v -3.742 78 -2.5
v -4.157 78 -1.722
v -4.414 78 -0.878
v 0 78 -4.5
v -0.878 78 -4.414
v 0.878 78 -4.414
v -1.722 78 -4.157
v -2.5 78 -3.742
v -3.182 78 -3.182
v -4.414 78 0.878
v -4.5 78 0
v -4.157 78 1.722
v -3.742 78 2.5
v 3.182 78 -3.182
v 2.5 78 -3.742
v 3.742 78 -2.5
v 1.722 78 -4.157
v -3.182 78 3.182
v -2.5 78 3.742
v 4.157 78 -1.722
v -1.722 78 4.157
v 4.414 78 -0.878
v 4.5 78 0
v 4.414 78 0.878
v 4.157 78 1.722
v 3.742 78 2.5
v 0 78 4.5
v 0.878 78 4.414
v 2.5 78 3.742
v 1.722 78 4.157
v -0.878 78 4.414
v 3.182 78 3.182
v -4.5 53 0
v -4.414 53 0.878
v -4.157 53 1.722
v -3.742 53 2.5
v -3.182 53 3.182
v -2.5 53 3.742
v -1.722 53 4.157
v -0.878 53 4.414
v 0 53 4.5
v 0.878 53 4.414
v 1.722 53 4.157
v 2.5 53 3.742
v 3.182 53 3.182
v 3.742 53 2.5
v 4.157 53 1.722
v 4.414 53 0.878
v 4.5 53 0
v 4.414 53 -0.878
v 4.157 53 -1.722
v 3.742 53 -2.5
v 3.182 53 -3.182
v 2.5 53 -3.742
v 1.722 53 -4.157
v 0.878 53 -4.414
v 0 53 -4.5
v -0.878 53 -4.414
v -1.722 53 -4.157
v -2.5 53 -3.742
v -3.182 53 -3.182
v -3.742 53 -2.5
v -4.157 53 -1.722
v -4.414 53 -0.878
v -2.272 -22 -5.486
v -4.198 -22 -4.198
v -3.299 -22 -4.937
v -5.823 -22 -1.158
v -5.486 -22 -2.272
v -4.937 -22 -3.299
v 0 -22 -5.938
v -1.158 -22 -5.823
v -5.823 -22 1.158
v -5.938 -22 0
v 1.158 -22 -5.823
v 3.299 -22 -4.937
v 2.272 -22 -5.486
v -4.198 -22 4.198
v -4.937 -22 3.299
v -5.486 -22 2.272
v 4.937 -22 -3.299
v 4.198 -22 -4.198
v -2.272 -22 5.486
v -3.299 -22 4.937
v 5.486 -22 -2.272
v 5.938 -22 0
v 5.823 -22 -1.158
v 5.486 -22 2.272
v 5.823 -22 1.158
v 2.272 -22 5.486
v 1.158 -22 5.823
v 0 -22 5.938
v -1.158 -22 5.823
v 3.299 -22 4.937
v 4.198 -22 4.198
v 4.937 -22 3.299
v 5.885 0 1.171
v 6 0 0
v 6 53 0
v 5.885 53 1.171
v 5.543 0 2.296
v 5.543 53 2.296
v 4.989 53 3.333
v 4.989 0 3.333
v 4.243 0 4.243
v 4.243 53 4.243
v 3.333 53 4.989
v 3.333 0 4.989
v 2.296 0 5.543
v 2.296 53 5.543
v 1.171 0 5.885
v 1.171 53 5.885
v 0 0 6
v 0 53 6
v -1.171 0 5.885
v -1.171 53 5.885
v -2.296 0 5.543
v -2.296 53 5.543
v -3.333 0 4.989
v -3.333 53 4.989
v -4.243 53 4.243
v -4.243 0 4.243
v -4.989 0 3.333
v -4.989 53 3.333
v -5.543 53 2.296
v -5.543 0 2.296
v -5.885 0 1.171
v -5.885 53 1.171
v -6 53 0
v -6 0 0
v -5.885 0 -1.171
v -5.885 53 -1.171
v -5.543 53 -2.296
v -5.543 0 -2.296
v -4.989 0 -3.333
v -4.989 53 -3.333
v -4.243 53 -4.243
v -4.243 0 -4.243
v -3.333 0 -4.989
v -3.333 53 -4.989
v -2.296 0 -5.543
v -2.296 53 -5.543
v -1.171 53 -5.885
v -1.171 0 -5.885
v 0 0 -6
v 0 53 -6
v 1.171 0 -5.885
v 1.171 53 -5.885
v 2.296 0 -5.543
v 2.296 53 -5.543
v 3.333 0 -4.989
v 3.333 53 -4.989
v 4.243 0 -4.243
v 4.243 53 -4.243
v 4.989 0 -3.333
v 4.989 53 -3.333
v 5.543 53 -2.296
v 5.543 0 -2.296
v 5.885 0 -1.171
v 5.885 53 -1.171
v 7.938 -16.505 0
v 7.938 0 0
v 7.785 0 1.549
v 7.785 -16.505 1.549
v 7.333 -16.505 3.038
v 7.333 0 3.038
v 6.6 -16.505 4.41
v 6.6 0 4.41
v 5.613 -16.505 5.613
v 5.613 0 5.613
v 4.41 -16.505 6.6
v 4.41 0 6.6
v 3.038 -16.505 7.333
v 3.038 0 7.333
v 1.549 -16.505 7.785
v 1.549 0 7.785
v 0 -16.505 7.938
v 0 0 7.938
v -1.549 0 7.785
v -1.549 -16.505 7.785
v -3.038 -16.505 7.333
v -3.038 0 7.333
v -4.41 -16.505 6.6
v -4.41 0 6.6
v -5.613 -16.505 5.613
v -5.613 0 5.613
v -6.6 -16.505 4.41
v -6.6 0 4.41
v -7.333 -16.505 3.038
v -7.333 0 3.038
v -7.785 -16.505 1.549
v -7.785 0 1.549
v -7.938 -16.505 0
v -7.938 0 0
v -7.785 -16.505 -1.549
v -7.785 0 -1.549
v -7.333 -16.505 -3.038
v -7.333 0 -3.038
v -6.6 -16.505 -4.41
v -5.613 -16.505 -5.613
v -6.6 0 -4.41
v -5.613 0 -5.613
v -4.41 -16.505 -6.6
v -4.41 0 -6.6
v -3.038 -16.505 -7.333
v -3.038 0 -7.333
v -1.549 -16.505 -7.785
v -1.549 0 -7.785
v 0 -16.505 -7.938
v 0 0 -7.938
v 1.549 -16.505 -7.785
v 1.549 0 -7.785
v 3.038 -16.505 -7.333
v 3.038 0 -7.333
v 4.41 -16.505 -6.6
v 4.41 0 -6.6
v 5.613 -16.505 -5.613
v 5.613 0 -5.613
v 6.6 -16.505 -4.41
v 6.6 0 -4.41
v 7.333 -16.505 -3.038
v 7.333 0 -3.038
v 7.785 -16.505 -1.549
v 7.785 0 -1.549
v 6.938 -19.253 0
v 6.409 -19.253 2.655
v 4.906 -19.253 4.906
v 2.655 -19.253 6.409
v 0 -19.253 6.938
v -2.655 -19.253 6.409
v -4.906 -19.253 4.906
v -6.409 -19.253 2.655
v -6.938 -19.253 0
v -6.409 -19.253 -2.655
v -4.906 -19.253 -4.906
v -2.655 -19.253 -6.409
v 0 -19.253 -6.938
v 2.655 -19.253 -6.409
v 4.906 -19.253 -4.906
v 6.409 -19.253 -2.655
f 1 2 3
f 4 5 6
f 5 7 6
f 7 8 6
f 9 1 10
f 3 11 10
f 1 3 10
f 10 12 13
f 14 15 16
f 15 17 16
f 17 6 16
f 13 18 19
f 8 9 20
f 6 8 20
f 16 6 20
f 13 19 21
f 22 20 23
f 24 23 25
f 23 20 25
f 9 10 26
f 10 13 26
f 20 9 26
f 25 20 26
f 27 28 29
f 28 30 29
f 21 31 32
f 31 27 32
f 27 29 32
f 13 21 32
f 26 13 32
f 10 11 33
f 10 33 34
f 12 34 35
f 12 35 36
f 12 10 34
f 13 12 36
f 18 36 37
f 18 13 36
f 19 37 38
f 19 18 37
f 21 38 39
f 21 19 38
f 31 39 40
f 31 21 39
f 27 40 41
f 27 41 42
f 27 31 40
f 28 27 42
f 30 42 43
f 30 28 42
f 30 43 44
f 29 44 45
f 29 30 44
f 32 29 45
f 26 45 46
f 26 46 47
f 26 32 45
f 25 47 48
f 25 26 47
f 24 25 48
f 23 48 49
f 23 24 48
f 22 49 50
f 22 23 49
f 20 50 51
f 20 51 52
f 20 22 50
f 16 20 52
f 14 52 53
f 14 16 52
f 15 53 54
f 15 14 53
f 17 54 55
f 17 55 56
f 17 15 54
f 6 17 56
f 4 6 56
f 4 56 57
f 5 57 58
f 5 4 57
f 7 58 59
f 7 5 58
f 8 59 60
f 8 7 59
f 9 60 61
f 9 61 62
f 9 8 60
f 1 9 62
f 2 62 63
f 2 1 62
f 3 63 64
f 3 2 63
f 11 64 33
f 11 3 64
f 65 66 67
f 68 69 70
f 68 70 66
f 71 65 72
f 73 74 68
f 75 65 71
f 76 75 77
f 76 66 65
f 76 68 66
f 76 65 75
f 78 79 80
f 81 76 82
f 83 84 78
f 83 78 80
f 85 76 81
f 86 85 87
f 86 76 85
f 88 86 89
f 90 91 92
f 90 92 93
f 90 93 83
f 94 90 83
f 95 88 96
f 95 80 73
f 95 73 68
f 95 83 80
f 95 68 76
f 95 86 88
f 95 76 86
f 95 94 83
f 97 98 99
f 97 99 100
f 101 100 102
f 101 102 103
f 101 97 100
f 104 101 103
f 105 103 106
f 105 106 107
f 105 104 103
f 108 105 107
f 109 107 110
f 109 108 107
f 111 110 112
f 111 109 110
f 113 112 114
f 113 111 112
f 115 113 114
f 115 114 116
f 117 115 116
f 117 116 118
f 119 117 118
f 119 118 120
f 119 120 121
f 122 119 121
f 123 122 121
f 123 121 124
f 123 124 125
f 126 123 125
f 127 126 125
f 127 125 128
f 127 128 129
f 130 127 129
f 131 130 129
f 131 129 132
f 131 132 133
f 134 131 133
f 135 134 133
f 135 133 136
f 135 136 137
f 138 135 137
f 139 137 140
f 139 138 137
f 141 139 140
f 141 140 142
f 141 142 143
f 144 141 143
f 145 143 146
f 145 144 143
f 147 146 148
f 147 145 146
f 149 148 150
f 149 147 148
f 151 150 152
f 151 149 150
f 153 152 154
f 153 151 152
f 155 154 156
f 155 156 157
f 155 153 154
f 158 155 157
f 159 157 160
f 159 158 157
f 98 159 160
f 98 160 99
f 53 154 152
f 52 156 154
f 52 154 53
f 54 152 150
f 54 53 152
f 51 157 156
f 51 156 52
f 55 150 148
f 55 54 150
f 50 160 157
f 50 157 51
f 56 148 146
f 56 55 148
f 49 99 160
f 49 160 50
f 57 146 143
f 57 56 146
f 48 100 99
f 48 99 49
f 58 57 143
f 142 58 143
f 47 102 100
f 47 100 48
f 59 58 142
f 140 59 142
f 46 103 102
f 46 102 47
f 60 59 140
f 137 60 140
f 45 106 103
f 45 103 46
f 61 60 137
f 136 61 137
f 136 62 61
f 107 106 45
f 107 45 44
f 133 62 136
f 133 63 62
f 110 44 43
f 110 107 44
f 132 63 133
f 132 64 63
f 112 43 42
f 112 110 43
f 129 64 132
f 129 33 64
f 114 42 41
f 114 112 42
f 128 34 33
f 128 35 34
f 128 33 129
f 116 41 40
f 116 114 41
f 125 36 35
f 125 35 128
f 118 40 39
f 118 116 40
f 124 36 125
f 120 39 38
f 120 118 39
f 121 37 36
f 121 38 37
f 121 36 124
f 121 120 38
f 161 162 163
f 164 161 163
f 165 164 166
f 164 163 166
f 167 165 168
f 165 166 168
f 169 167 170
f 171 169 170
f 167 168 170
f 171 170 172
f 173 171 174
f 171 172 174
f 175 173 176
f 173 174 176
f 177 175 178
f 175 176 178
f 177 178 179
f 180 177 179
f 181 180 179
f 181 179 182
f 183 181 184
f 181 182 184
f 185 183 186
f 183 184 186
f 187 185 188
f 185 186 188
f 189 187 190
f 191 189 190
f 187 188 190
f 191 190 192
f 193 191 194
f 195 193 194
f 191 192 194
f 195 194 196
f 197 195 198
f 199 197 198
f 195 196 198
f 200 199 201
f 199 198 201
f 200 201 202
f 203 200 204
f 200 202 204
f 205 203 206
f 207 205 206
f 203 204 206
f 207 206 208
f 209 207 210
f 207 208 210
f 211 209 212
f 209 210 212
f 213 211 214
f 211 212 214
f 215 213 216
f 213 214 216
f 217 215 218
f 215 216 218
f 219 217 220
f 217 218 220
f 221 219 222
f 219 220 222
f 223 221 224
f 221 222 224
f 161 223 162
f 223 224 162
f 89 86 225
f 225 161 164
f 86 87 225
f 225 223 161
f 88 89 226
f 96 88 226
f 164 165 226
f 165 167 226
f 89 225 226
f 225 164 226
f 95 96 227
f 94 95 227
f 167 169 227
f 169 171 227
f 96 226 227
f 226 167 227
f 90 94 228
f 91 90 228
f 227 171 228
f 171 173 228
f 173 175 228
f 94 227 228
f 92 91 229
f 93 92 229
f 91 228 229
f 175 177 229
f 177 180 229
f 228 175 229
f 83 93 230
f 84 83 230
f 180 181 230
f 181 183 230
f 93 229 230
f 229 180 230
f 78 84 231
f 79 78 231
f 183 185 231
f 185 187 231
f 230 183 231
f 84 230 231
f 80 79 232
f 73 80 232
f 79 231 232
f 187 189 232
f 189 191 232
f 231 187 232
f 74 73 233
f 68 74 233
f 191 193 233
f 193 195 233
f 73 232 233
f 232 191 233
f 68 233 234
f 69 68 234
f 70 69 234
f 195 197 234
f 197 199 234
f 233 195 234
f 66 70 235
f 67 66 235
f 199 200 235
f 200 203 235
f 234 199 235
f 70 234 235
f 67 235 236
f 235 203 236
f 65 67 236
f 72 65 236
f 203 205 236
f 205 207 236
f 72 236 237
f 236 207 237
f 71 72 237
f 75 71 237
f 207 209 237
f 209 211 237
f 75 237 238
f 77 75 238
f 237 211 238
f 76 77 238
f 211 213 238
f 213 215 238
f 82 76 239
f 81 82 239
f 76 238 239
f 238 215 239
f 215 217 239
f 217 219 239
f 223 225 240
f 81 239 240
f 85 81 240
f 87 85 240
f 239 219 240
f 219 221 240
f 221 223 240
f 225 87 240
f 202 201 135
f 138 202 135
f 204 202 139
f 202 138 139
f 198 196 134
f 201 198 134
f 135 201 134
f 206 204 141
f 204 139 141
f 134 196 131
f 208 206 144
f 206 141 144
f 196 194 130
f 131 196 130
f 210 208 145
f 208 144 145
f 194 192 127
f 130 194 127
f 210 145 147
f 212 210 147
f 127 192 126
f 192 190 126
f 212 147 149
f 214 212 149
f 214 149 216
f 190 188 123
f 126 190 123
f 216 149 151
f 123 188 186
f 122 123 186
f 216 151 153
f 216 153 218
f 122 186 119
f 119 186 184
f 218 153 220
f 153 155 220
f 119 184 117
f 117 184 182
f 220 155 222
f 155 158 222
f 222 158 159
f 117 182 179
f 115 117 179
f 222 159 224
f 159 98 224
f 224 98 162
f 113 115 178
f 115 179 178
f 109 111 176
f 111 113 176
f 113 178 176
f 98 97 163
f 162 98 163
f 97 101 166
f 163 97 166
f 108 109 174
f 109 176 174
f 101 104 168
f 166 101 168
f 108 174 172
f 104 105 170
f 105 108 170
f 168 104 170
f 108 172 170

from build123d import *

# Parameters (mm, degrees)
F0_R     = 7.9375
F1_DEPTH = 22
F2_R     = 6
F3_DEPTH = 78
F4_R     = 6
F4_R_2   = 4.5
F5_DEPTH = 25
F6_SIZE2 = 5.4949548389
F6_SIZE  = 2


# Not quite as in the source:
# - a feature names something its author has since deleted; it is built from what else it names


with BuildPart() as f1:
    # F0 (on Front) → F1 (new body)
    with BuildSketch(Plane.XZ):
        Circle(F0_R)
    extrude(amount=F1_DEPTH)

    # F2 (on Front) → F3 (join)
    with BuildSketch(Plane.XZ):
        Circle(F2_R)
    extrude(amount=-F3_DEPTH)

    # F4 (on face) → F5 (cut)
    with BuildSketch(Plane(origin=(0, 78, 0), x_dir=(-1, 0, 0), z_dir=(0, 1, 0))):
        Circle(F4_R)
        Circle(F4_R_2, mode=Mode.SUBTRACT)
    extrude(amount=-F5_DEPTH, mode=Mode.SUBTRACT)

    # F6
    f6_edges = [f1.edges().sort_by_distance(p)[0] for p in [
        (-7.9375, -22, 0),
    ]]
    f6_side = f1.faces().sort_by_distance((0, -22, 0))[0]
    chamfer(f6_edges, length=F6_SIZE, length2=F6_SIZE2, reference=f6_side)


solid = f1.part
